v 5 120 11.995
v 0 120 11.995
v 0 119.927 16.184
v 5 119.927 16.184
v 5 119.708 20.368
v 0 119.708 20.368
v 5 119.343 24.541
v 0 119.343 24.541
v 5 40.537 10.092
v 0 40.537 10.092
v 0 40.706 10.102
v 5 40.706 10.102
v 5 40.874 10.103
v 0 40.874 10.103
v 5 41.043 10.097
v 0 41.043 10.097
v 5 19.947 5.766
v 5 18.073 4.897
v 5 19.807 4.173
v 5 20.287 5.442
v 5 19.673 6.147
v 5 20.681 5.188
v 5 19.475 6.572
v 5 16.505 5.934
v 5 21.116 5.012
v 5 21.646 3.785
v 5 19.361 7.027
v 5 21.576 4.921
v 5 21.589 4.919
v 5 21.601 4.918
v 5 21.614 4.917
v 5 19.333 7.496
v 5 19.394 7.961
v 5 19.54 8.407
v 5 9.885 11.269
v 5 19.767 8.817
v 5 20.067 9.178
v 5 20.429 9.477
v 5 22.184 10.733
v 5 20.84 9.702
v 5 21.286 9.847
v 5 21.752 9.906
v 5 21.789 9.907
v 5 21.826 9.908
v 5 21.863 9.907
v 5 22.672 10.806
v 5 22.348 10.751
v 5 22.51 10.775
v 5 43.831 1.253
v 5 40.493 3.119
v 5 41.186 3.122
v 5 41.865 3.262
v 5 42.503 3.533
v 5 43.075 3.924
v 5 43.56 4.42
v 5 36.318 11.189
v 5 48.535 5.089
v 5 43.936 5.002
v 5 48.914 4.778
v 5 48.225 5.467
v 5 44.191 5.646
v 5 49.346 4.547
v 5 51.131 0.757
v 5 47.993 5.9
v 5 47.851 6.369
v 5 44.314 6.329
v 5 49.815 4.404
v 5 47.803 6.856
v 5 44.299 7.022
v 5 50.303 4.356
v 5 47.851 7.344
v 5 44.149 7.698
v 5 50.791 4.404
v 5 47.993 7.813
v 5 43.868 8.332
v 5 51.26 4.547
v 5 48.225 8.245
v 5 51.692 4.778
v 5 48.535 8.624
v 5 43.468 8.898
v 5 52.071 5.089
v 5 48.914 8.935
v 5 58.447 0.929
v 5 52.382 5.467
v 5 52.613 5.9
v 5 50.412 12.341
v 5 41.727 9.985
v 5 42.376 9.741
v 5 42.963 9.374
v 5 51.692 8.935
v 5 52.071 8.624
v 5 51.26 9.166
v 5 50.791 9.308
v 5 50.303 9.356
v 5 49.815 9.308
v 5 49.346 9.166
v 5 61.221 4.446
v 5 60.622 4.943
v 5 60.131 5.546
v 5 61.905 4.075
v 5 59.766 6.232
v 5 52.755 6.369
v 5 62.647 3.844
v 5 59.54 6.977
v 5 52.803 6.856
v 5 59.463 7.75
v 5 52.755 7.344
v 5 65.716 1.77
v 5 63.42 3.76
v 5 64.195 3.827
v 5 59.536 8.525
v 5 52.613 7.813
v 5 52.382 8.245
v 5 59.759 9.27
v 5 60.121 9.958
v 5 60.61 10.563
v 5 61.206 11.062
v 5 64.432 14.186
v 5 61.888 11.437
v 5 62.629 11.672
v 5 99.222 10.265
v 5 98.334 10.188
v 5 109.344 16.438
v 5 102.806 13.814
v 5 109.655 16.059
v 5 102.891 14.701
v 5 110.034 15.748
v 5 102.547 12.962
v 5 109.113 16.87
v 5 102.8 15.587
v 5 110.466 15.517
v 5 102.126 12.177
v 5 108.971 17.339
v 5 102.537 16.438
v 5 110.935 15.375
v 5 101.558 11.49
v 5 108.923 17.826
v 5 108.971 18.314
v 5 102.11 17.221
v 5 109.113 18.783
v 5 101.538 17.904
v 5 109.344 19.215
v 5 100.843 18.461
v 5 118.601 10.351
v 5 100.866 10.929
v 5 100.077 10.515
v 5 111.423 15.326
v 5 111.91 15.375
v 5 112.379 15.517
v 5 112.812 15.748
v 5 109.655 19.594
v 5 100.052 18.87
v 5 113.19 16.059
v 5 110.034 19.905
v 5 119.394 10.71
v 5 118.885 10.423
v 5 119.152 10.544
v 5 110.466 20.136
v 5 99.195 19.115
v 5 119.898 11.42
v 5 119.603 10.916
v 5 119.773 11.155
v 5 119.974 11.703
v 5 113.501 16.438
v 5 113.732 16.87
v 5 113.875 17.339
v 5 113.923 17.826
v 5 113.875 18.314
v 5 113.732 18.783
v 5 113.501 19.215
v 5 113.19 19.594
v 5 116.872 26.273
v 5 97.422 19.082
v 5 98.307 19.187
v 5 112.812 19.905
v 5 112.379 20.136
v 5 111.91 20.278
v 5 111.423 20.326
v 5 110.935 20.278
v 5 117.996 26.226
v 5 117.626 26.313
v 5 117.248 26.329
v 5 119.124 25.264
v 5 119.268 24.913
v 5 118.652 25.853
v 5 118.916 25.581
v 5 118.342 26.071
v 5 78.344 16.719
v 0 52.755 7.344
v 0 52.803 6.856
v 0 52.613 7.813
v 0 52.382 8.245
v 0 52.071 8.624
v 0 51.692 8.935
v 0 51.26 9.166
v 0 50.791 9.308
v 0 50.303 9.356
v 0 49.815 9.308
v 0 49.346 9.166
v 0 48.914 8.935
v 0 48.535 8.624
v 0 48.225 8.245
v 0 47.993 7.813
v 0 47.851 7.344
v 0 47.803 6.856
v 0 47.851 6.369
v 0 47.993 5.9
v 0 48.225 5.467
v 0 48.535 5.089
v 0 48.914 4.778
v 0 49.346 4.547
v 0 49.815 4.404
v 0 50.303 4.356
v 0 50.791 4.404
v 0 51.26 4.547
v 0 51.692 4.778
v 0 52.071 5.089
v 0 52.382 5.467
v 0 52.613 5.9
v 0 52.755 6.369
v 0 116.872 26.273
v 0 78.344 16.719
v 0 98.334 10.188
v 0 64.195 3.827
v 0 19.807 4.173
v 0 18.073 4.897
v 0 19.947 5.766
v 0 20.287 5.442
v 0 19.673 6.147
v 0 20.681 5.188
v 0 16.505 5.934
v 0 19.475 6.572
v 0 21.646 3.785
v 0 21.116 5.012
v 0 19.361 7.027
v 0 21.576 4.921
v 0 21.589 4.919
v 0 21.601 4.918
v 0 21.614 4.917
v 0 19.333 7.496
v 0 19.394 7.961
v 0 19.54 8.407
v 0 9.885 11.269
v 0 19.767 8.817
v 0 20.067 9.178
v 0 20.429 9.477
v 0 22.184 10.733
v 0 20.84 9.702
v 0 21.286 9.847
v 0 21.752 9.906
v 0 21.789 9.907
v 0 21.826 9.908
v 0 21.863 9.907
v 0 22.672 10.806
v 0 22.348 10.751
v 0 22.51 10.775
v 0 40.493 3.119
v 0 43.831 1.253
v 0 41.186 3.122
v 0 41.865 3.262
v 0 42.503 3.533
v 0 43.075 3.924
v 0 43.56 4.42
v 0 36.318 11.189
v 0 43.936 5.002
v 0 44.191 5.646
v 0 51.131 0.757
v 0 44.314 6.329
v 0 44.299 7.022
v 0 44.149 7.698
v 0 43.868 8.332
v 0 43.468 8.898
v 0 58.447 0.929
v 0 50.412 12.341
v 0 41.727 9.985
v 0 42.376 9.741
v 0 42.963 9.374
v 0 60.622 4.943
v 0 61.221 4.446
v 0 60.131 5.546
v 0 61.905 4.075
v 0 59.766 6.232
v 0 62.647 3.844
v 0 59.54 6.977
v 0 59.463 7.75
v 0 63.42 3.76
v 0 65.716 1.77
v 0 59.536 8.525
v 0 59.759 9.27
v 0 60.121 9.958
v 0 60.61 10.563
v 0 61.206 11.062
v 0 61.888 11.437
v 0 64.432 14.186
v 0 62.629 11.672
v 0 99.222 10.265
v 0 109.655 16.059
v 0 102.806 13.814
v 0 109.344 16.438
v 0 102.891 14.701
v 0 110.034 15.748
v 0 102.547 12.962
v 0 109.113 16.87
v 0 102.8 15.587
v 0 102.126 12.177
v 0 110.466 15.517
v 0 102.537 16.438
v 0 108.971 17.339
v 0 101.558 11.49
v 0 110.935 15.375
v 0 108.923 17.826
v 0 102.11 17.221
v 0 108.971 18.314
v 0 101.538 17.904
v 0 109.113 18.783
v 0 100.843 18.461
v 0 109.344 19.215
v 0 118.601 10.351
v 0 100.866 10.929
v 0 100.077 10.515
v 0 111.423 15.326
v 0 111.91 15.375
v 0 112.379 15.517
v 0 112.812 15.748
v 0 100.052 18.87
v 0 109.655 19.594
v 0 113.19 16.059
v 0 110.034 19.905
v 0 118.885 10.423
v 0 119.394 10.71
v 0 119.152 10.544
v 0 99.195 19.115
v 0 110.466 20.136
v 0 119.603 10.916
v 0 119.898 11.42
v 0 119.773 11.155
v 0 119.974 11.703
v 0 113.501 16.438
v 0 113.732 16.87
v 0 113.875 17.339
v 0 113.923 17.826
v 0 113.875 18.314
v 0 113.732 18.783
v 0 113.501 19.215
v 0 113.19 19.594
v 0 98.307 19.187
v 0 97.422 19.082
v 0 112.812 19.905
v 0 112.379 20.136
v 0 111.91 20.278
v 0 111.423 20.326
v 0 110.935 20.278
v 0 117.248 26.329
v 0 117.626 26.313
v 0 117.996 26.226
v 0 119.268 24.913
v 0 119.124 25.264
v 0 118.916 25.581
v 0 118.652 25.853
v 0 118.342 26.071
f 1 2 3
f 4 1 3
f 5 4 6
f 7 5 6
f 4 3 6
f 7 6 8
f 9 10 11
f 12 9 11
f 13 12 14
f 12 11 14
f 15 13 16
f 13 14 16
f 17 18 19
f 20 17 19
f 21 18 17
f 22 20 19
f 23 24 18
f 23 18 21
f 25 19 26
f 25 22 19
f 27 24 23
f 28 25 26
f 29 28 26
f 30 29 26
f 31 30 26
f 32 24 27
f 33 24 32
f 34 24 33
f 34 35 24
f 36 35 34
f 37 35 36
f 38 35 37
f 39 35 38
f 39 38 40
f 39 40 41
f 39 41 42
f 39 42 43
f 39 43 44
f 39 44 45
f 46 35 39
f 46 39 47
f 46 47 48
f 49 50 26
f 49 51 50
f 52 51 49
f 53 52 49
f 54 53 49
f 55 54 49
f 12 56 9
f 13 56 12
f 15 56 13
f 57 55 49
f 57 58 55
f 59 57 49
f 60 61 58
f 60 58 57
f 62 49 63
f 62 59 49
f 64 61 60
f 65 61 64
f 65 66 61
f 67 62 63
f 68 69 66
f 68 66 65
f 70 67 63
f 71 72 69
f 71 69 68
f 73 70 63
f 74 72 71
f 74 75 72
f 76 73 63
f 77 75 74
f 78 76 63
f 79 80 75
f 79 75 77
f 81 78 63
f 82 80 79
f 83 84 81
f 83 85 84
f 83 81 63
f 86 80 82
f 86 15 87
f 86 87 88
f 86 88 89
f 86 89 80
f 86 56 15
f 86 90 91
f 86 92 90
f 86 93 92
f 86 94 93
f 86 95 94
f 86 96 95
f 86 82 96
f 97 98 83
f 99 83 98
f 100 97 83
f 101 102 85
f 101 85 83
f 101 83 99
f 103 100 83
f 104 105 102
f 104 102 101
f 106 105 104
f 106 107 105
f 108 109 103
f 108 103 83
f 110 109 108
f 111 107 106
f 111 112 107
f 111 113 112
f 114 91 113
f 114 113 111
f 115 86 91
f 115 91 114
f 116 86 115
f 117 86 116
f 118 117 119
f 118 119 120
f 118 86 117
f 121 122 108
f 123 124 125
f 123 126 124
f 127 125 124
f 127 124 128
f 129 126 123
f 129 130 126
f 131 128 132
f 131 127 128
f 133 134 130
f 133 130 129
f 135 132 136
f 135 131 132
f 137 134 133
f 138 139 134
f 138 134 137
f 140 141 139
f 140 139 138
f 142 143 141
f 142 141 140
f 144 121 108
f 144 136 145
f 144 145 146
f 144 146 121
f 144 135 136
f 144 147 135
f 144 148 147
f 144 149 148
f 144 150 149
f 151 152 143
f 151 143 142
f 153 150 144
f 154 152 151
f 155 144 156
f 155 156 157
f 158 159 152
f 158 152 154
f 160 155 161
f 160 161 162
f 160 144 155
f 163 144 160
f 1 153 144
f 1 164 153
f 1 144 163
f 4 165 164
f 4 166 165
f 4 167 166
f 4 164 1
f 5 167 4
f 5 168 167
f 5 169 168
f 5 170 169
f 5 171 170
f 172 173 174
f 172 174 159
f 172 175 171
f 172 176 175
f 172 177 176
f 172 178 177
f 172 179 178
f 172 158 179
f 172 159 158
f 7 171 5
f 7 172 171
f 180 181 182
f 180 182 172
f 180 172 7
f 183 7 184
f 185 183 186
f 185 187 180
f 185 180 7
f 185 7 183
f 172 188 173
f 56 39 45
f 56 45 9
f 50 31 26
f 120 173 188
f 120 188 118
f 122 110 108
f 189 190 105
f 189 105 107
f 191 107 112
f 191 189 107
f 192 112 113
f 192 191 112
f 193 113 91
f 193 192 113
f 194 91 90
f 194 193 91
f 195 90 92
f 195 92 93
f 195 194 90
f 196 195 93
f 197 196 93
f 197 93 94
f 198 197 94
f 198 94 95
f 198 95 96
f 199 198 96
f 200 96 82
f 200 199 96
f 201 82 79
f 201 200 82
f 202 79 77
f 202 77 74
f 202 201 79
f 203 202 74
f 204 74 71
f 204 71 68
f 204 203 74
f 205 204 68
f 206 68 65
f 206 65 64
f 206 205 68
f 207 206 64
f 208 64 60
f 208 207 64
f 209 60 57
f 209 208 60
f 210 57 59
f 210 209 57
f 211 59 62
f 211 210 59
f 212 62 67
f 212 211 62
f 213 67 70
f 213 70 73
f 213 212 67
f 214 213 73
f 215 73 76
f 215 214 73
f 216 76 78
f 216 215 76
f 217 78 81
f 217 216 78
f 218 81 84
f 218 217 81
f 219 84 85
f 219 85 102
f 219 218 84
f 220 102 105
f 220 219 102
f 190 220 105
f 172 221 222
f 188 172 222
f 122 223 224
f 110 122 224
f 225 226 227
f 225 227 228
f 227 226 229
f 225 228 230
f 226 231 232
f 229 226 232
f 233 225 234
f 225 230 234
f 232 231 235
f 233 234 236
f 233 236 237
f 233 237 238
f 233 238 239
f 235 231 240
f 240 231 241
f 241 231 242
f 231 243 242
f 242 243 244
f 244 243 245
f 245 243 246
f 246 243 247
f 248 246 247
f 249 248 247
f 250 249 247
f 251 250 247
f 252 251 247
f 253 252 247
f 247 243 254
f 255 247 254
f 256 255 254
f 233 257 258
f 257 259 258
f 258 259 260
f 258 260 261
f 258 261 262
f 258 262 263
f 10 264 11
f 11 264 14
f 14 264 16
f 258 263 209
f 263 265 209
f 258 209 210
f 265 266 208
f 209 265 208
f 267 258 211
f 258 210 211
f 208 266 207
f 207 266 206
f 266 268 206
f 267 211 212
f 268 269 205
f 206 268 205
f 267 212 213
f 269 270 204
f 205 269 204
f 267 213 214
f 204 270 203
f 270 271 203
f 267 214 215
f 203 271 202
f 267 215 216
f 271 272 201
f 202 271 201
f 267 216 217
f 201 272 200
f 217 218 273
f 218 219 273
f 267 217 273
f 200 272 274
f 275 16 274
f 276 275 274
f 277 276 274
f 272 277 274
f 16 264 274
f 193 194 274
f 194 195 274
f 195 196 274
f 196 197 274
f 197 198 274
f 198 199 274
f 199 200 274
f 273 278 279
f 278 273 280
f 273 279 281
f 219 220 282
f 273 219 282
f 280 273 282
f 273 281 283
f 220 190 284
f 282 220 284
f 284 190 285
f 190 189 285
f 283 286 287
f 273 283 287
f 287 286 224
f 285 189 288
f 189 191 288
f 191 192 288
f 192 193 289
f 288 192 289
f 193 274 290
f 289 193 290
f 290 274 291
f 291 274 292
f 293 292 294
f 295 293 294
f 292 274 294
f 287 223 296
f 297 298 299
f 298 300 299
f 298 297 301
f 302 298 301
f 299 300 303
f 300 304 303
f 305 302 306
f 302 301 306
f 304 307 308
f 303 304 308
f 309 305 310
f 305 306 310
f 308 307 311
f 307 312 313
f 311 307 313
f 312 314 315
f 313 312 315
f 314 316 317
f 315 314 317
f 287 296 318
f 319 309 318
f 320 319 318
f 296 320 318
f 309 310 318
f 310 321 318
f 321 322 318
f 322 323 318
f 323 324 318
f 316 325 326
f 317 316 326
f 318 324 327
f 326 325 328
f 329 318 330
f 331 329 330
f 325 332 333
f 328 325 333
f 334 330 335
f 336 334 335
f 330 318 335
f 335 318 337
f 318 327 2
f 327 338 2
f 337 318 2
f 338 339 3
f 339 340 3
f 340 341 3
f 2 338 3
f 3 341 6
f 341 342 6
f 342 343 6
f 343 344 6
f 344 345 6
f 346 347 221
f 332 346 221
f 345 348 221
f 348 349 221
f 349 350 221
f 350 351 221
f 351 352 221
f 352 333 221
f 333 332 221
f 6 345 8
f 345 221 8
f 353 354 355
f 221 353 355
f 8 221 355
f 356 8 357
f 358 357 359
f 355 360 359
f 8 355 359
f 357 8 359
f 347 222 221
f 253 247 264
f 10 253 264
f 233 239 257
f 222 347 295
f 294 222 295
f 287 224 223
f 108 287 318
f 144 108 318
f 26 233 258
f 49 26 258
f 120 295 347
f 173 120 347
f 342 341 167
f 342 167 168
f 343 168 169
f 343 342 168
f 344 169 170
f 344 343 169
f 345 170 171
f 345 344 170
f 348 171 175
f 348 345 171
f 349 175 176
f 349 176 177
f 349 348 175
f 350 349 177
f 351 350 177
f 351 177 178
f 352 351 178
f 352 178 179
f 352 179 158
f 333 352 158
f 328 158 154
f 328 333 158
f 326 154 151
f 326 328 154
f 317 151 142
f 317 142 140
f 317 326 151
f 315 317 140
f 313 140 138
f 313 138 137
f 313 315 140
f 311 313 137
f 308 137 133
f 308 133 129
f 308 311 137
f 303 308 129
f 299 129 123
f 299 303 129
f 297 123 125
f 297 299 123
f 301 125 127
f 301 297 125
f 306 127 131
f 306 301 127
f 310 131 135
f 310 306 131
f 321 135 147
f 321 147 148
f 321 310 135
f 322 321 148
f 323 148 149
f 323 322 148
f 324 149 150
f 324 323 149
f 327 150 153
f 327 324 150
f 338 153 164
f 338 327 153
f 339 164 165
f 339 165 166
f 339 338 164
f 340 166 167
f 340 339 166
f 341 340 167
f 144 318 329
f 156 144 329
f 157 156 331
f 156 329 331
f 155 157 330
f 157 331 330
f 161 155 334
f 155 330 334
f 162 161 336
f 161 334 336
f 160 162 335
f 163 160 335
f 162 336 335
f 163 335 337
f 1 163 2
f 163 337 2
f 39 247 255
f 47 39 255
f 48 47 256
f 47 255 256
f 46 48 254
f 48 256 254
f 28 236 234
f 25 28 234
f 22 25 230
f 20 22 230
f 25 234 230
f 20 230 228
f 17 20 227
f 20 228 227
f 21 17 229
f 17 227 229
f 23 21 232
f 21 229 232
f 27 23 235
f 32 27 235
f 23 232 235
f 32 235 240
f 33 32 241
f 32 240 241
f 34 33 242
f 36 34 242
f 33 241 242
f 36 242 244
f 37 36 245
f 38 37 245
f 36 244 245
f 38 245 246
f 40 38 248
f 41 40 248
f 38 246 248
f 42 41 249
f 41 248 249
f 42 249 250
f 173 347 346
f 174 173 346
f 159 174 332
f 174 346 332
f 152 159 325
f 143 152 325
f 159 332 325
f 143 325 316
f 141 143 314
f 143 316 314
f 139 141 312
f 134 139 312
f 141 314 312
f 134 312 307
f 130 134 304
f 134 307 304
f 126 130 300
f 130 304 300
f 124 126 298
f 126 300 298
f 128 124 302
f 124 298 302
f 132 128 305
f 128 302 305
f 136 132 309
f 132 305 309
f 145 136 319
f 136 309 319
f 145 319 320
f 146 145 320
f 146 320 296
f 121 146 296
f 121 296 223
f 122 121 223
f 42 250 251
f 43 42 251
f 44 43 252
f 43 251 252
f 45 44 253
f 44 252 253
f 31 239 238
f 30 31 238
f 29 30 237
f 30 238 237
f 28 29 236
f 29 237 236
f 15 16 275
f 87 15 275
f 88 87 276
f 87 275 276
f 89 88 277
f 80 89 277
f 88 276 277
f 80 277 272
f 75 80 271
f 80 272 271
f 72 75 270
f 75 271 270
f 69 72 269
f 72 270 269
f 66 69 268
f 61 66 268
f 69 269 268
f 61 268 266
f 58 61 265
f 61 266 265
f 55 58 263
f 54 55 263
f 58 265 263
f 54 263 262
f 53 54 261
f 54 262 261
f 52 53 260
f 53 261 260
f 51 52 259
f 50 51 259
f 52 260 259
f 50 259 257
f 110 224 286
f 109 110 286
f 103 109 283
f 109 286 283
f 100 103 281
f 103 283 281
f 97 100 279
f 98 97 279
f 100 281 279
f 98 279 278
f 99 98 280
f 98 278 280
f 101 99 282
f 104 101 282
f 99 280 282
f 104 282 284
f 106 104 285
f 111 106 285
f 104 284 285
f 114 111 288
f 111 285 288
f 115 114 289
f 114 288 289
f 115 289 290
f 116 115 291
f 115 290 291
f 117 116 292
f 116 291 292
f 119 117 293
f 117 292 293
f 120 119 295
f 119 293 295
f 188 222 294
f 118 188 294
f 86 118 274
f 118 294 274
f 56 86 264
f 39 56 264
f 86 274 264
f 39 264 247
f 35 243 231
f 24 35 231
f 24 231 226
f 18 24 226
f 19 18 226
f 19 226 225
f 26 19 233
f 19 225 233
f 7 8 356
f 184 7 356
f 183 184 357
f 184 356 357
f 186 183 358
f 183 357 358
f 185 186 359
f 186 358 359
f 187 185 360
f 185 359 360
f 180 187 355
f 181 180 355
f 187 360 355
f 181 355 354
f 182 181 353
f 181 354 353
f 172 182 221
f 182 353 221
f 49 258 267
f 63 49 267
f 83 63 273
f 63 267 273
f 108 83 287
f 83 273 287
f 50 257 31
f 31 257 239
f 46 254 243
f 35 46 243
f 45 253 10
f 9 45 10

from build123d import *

# Parameters (mm, degrees)
F0_R     = 2.5
F1_DEPTH = 5


# Not quite as in the source:
# - a feature names something its author has since deleted; it is built from what else it names


with BuildPart() as f1:
    # F0 (on Right) → F1 (new body)
    with BuildSketch(Plane.YZ):
        with BuildLine():
            ThreePointArc((118.6011307413, 10.3511984734), (119.6029410321, 10.9159653279), (119.9999999073, 11.9952844227))
            ThreePointArc((119.9999999073, 11.9952844227), (119.8357295493, 18.2767765127), (119.3428752162, 24.5410579746))
            ThreePointArc((119.3428752162, 24.5410579746), (118.5020303548, 25.9696085801), (116.872434029, 26.2732411356))
            Line((116.872434029, 26.2732411356), (78.344444671, 16.7187866332))
            ThreePointArc((78.344444671, 16.7187866332), (50.4120849121, 12.3407543123), (22.1844688263, 10.7327808001))
            ThreePointArc((22.1844688263, 10.7327808001), (22.4292060309, 10.7620820299), (22.6716738588, 10.8064014821))
            Line((22.6716738588, 10.8064014821), (9.8850433167, 11.2693933781))
            Line((9.8850433167, 11.2693933781), (16.5052597895, 5.9341389572))
            ThreePointArc((16.5052597895, 5.9341389572), (18.9230306979, 4.4941821172), (21.6462541623, 3.7848543869))
            Line((21.6462541623, 3.7848543869), (43.8305606526, 1.2529498543))
            ThreePointArc((43.8305606526, 1.2529498543), (54.7908574561, 0.7592543704), (65.7156304083, 1.7697874952))
            Line((65.7156304083, 1.7697874952), (118.6011307413, 10.3511984734))
        make_face()
        with BuildLine():
            ThreePointArc((41.0425990366, 10.096905354), (44.3135999527, 6.3287058646), (40.4926591764, 3.1194713813))
            Line((40.4926591764, 3.1194713813), (21.6135530725, 4.9170973917))
            ThreePointArc((21.6135530725, 4.9170973917), (21.5948304706, 4.9188091028), (21.5761212705, 4.9206615636))
            ThreePointArc((21.5761212705, 4.9206615636), (19.3333513171, 7.4955245428), (21.7516674536, 9.9062678907))
            ThreePointArc((21.7516674536, 9.9062678907), (21.8070986498, 9.9074304985), (21.8625419965, 9.9073635786))
            Line((21.8625419965, 9.9073635786), (40.5372507264, 10.0919113847))
            ThreePointArc((40.5372507264, 10.0919113847), (40.7898346274, 10.1035413352), (41.0425990366, 10.096905354))
        make_face(mode=Mode.SUBTRACT)
        with Locations((50.3031872213, 6.8563437089)):
            Circle(F0_R, mode=Mode.SUBTRACT)
        with BuildLine():
            ThreePointArc((97.4222943066, 19.082035474), (102.8677433707, 15.1465744396), (98.3342272396, 10.1879455412))
            Line((98.3342272396, 10.1879455412), (64.1951699406, 3.8271960831))
            ThreePointArc((64.1951699406, 3.8271960831), (59.5398910648, 6.9765078631), (62.6292671904, 11.6717758272))
            Line((62.6292671904, 11.6717758272), (97.4222943066, 19.082035474))
        make_face(mode=Mode.SUBTRACT)
        with Locations((111.4225909114, 17.8264938295)):
            Circle(F0_R, mode=Mode.SUBTRACT)
    extrude(amount=F1_DEPTH)


solid = f1.part
